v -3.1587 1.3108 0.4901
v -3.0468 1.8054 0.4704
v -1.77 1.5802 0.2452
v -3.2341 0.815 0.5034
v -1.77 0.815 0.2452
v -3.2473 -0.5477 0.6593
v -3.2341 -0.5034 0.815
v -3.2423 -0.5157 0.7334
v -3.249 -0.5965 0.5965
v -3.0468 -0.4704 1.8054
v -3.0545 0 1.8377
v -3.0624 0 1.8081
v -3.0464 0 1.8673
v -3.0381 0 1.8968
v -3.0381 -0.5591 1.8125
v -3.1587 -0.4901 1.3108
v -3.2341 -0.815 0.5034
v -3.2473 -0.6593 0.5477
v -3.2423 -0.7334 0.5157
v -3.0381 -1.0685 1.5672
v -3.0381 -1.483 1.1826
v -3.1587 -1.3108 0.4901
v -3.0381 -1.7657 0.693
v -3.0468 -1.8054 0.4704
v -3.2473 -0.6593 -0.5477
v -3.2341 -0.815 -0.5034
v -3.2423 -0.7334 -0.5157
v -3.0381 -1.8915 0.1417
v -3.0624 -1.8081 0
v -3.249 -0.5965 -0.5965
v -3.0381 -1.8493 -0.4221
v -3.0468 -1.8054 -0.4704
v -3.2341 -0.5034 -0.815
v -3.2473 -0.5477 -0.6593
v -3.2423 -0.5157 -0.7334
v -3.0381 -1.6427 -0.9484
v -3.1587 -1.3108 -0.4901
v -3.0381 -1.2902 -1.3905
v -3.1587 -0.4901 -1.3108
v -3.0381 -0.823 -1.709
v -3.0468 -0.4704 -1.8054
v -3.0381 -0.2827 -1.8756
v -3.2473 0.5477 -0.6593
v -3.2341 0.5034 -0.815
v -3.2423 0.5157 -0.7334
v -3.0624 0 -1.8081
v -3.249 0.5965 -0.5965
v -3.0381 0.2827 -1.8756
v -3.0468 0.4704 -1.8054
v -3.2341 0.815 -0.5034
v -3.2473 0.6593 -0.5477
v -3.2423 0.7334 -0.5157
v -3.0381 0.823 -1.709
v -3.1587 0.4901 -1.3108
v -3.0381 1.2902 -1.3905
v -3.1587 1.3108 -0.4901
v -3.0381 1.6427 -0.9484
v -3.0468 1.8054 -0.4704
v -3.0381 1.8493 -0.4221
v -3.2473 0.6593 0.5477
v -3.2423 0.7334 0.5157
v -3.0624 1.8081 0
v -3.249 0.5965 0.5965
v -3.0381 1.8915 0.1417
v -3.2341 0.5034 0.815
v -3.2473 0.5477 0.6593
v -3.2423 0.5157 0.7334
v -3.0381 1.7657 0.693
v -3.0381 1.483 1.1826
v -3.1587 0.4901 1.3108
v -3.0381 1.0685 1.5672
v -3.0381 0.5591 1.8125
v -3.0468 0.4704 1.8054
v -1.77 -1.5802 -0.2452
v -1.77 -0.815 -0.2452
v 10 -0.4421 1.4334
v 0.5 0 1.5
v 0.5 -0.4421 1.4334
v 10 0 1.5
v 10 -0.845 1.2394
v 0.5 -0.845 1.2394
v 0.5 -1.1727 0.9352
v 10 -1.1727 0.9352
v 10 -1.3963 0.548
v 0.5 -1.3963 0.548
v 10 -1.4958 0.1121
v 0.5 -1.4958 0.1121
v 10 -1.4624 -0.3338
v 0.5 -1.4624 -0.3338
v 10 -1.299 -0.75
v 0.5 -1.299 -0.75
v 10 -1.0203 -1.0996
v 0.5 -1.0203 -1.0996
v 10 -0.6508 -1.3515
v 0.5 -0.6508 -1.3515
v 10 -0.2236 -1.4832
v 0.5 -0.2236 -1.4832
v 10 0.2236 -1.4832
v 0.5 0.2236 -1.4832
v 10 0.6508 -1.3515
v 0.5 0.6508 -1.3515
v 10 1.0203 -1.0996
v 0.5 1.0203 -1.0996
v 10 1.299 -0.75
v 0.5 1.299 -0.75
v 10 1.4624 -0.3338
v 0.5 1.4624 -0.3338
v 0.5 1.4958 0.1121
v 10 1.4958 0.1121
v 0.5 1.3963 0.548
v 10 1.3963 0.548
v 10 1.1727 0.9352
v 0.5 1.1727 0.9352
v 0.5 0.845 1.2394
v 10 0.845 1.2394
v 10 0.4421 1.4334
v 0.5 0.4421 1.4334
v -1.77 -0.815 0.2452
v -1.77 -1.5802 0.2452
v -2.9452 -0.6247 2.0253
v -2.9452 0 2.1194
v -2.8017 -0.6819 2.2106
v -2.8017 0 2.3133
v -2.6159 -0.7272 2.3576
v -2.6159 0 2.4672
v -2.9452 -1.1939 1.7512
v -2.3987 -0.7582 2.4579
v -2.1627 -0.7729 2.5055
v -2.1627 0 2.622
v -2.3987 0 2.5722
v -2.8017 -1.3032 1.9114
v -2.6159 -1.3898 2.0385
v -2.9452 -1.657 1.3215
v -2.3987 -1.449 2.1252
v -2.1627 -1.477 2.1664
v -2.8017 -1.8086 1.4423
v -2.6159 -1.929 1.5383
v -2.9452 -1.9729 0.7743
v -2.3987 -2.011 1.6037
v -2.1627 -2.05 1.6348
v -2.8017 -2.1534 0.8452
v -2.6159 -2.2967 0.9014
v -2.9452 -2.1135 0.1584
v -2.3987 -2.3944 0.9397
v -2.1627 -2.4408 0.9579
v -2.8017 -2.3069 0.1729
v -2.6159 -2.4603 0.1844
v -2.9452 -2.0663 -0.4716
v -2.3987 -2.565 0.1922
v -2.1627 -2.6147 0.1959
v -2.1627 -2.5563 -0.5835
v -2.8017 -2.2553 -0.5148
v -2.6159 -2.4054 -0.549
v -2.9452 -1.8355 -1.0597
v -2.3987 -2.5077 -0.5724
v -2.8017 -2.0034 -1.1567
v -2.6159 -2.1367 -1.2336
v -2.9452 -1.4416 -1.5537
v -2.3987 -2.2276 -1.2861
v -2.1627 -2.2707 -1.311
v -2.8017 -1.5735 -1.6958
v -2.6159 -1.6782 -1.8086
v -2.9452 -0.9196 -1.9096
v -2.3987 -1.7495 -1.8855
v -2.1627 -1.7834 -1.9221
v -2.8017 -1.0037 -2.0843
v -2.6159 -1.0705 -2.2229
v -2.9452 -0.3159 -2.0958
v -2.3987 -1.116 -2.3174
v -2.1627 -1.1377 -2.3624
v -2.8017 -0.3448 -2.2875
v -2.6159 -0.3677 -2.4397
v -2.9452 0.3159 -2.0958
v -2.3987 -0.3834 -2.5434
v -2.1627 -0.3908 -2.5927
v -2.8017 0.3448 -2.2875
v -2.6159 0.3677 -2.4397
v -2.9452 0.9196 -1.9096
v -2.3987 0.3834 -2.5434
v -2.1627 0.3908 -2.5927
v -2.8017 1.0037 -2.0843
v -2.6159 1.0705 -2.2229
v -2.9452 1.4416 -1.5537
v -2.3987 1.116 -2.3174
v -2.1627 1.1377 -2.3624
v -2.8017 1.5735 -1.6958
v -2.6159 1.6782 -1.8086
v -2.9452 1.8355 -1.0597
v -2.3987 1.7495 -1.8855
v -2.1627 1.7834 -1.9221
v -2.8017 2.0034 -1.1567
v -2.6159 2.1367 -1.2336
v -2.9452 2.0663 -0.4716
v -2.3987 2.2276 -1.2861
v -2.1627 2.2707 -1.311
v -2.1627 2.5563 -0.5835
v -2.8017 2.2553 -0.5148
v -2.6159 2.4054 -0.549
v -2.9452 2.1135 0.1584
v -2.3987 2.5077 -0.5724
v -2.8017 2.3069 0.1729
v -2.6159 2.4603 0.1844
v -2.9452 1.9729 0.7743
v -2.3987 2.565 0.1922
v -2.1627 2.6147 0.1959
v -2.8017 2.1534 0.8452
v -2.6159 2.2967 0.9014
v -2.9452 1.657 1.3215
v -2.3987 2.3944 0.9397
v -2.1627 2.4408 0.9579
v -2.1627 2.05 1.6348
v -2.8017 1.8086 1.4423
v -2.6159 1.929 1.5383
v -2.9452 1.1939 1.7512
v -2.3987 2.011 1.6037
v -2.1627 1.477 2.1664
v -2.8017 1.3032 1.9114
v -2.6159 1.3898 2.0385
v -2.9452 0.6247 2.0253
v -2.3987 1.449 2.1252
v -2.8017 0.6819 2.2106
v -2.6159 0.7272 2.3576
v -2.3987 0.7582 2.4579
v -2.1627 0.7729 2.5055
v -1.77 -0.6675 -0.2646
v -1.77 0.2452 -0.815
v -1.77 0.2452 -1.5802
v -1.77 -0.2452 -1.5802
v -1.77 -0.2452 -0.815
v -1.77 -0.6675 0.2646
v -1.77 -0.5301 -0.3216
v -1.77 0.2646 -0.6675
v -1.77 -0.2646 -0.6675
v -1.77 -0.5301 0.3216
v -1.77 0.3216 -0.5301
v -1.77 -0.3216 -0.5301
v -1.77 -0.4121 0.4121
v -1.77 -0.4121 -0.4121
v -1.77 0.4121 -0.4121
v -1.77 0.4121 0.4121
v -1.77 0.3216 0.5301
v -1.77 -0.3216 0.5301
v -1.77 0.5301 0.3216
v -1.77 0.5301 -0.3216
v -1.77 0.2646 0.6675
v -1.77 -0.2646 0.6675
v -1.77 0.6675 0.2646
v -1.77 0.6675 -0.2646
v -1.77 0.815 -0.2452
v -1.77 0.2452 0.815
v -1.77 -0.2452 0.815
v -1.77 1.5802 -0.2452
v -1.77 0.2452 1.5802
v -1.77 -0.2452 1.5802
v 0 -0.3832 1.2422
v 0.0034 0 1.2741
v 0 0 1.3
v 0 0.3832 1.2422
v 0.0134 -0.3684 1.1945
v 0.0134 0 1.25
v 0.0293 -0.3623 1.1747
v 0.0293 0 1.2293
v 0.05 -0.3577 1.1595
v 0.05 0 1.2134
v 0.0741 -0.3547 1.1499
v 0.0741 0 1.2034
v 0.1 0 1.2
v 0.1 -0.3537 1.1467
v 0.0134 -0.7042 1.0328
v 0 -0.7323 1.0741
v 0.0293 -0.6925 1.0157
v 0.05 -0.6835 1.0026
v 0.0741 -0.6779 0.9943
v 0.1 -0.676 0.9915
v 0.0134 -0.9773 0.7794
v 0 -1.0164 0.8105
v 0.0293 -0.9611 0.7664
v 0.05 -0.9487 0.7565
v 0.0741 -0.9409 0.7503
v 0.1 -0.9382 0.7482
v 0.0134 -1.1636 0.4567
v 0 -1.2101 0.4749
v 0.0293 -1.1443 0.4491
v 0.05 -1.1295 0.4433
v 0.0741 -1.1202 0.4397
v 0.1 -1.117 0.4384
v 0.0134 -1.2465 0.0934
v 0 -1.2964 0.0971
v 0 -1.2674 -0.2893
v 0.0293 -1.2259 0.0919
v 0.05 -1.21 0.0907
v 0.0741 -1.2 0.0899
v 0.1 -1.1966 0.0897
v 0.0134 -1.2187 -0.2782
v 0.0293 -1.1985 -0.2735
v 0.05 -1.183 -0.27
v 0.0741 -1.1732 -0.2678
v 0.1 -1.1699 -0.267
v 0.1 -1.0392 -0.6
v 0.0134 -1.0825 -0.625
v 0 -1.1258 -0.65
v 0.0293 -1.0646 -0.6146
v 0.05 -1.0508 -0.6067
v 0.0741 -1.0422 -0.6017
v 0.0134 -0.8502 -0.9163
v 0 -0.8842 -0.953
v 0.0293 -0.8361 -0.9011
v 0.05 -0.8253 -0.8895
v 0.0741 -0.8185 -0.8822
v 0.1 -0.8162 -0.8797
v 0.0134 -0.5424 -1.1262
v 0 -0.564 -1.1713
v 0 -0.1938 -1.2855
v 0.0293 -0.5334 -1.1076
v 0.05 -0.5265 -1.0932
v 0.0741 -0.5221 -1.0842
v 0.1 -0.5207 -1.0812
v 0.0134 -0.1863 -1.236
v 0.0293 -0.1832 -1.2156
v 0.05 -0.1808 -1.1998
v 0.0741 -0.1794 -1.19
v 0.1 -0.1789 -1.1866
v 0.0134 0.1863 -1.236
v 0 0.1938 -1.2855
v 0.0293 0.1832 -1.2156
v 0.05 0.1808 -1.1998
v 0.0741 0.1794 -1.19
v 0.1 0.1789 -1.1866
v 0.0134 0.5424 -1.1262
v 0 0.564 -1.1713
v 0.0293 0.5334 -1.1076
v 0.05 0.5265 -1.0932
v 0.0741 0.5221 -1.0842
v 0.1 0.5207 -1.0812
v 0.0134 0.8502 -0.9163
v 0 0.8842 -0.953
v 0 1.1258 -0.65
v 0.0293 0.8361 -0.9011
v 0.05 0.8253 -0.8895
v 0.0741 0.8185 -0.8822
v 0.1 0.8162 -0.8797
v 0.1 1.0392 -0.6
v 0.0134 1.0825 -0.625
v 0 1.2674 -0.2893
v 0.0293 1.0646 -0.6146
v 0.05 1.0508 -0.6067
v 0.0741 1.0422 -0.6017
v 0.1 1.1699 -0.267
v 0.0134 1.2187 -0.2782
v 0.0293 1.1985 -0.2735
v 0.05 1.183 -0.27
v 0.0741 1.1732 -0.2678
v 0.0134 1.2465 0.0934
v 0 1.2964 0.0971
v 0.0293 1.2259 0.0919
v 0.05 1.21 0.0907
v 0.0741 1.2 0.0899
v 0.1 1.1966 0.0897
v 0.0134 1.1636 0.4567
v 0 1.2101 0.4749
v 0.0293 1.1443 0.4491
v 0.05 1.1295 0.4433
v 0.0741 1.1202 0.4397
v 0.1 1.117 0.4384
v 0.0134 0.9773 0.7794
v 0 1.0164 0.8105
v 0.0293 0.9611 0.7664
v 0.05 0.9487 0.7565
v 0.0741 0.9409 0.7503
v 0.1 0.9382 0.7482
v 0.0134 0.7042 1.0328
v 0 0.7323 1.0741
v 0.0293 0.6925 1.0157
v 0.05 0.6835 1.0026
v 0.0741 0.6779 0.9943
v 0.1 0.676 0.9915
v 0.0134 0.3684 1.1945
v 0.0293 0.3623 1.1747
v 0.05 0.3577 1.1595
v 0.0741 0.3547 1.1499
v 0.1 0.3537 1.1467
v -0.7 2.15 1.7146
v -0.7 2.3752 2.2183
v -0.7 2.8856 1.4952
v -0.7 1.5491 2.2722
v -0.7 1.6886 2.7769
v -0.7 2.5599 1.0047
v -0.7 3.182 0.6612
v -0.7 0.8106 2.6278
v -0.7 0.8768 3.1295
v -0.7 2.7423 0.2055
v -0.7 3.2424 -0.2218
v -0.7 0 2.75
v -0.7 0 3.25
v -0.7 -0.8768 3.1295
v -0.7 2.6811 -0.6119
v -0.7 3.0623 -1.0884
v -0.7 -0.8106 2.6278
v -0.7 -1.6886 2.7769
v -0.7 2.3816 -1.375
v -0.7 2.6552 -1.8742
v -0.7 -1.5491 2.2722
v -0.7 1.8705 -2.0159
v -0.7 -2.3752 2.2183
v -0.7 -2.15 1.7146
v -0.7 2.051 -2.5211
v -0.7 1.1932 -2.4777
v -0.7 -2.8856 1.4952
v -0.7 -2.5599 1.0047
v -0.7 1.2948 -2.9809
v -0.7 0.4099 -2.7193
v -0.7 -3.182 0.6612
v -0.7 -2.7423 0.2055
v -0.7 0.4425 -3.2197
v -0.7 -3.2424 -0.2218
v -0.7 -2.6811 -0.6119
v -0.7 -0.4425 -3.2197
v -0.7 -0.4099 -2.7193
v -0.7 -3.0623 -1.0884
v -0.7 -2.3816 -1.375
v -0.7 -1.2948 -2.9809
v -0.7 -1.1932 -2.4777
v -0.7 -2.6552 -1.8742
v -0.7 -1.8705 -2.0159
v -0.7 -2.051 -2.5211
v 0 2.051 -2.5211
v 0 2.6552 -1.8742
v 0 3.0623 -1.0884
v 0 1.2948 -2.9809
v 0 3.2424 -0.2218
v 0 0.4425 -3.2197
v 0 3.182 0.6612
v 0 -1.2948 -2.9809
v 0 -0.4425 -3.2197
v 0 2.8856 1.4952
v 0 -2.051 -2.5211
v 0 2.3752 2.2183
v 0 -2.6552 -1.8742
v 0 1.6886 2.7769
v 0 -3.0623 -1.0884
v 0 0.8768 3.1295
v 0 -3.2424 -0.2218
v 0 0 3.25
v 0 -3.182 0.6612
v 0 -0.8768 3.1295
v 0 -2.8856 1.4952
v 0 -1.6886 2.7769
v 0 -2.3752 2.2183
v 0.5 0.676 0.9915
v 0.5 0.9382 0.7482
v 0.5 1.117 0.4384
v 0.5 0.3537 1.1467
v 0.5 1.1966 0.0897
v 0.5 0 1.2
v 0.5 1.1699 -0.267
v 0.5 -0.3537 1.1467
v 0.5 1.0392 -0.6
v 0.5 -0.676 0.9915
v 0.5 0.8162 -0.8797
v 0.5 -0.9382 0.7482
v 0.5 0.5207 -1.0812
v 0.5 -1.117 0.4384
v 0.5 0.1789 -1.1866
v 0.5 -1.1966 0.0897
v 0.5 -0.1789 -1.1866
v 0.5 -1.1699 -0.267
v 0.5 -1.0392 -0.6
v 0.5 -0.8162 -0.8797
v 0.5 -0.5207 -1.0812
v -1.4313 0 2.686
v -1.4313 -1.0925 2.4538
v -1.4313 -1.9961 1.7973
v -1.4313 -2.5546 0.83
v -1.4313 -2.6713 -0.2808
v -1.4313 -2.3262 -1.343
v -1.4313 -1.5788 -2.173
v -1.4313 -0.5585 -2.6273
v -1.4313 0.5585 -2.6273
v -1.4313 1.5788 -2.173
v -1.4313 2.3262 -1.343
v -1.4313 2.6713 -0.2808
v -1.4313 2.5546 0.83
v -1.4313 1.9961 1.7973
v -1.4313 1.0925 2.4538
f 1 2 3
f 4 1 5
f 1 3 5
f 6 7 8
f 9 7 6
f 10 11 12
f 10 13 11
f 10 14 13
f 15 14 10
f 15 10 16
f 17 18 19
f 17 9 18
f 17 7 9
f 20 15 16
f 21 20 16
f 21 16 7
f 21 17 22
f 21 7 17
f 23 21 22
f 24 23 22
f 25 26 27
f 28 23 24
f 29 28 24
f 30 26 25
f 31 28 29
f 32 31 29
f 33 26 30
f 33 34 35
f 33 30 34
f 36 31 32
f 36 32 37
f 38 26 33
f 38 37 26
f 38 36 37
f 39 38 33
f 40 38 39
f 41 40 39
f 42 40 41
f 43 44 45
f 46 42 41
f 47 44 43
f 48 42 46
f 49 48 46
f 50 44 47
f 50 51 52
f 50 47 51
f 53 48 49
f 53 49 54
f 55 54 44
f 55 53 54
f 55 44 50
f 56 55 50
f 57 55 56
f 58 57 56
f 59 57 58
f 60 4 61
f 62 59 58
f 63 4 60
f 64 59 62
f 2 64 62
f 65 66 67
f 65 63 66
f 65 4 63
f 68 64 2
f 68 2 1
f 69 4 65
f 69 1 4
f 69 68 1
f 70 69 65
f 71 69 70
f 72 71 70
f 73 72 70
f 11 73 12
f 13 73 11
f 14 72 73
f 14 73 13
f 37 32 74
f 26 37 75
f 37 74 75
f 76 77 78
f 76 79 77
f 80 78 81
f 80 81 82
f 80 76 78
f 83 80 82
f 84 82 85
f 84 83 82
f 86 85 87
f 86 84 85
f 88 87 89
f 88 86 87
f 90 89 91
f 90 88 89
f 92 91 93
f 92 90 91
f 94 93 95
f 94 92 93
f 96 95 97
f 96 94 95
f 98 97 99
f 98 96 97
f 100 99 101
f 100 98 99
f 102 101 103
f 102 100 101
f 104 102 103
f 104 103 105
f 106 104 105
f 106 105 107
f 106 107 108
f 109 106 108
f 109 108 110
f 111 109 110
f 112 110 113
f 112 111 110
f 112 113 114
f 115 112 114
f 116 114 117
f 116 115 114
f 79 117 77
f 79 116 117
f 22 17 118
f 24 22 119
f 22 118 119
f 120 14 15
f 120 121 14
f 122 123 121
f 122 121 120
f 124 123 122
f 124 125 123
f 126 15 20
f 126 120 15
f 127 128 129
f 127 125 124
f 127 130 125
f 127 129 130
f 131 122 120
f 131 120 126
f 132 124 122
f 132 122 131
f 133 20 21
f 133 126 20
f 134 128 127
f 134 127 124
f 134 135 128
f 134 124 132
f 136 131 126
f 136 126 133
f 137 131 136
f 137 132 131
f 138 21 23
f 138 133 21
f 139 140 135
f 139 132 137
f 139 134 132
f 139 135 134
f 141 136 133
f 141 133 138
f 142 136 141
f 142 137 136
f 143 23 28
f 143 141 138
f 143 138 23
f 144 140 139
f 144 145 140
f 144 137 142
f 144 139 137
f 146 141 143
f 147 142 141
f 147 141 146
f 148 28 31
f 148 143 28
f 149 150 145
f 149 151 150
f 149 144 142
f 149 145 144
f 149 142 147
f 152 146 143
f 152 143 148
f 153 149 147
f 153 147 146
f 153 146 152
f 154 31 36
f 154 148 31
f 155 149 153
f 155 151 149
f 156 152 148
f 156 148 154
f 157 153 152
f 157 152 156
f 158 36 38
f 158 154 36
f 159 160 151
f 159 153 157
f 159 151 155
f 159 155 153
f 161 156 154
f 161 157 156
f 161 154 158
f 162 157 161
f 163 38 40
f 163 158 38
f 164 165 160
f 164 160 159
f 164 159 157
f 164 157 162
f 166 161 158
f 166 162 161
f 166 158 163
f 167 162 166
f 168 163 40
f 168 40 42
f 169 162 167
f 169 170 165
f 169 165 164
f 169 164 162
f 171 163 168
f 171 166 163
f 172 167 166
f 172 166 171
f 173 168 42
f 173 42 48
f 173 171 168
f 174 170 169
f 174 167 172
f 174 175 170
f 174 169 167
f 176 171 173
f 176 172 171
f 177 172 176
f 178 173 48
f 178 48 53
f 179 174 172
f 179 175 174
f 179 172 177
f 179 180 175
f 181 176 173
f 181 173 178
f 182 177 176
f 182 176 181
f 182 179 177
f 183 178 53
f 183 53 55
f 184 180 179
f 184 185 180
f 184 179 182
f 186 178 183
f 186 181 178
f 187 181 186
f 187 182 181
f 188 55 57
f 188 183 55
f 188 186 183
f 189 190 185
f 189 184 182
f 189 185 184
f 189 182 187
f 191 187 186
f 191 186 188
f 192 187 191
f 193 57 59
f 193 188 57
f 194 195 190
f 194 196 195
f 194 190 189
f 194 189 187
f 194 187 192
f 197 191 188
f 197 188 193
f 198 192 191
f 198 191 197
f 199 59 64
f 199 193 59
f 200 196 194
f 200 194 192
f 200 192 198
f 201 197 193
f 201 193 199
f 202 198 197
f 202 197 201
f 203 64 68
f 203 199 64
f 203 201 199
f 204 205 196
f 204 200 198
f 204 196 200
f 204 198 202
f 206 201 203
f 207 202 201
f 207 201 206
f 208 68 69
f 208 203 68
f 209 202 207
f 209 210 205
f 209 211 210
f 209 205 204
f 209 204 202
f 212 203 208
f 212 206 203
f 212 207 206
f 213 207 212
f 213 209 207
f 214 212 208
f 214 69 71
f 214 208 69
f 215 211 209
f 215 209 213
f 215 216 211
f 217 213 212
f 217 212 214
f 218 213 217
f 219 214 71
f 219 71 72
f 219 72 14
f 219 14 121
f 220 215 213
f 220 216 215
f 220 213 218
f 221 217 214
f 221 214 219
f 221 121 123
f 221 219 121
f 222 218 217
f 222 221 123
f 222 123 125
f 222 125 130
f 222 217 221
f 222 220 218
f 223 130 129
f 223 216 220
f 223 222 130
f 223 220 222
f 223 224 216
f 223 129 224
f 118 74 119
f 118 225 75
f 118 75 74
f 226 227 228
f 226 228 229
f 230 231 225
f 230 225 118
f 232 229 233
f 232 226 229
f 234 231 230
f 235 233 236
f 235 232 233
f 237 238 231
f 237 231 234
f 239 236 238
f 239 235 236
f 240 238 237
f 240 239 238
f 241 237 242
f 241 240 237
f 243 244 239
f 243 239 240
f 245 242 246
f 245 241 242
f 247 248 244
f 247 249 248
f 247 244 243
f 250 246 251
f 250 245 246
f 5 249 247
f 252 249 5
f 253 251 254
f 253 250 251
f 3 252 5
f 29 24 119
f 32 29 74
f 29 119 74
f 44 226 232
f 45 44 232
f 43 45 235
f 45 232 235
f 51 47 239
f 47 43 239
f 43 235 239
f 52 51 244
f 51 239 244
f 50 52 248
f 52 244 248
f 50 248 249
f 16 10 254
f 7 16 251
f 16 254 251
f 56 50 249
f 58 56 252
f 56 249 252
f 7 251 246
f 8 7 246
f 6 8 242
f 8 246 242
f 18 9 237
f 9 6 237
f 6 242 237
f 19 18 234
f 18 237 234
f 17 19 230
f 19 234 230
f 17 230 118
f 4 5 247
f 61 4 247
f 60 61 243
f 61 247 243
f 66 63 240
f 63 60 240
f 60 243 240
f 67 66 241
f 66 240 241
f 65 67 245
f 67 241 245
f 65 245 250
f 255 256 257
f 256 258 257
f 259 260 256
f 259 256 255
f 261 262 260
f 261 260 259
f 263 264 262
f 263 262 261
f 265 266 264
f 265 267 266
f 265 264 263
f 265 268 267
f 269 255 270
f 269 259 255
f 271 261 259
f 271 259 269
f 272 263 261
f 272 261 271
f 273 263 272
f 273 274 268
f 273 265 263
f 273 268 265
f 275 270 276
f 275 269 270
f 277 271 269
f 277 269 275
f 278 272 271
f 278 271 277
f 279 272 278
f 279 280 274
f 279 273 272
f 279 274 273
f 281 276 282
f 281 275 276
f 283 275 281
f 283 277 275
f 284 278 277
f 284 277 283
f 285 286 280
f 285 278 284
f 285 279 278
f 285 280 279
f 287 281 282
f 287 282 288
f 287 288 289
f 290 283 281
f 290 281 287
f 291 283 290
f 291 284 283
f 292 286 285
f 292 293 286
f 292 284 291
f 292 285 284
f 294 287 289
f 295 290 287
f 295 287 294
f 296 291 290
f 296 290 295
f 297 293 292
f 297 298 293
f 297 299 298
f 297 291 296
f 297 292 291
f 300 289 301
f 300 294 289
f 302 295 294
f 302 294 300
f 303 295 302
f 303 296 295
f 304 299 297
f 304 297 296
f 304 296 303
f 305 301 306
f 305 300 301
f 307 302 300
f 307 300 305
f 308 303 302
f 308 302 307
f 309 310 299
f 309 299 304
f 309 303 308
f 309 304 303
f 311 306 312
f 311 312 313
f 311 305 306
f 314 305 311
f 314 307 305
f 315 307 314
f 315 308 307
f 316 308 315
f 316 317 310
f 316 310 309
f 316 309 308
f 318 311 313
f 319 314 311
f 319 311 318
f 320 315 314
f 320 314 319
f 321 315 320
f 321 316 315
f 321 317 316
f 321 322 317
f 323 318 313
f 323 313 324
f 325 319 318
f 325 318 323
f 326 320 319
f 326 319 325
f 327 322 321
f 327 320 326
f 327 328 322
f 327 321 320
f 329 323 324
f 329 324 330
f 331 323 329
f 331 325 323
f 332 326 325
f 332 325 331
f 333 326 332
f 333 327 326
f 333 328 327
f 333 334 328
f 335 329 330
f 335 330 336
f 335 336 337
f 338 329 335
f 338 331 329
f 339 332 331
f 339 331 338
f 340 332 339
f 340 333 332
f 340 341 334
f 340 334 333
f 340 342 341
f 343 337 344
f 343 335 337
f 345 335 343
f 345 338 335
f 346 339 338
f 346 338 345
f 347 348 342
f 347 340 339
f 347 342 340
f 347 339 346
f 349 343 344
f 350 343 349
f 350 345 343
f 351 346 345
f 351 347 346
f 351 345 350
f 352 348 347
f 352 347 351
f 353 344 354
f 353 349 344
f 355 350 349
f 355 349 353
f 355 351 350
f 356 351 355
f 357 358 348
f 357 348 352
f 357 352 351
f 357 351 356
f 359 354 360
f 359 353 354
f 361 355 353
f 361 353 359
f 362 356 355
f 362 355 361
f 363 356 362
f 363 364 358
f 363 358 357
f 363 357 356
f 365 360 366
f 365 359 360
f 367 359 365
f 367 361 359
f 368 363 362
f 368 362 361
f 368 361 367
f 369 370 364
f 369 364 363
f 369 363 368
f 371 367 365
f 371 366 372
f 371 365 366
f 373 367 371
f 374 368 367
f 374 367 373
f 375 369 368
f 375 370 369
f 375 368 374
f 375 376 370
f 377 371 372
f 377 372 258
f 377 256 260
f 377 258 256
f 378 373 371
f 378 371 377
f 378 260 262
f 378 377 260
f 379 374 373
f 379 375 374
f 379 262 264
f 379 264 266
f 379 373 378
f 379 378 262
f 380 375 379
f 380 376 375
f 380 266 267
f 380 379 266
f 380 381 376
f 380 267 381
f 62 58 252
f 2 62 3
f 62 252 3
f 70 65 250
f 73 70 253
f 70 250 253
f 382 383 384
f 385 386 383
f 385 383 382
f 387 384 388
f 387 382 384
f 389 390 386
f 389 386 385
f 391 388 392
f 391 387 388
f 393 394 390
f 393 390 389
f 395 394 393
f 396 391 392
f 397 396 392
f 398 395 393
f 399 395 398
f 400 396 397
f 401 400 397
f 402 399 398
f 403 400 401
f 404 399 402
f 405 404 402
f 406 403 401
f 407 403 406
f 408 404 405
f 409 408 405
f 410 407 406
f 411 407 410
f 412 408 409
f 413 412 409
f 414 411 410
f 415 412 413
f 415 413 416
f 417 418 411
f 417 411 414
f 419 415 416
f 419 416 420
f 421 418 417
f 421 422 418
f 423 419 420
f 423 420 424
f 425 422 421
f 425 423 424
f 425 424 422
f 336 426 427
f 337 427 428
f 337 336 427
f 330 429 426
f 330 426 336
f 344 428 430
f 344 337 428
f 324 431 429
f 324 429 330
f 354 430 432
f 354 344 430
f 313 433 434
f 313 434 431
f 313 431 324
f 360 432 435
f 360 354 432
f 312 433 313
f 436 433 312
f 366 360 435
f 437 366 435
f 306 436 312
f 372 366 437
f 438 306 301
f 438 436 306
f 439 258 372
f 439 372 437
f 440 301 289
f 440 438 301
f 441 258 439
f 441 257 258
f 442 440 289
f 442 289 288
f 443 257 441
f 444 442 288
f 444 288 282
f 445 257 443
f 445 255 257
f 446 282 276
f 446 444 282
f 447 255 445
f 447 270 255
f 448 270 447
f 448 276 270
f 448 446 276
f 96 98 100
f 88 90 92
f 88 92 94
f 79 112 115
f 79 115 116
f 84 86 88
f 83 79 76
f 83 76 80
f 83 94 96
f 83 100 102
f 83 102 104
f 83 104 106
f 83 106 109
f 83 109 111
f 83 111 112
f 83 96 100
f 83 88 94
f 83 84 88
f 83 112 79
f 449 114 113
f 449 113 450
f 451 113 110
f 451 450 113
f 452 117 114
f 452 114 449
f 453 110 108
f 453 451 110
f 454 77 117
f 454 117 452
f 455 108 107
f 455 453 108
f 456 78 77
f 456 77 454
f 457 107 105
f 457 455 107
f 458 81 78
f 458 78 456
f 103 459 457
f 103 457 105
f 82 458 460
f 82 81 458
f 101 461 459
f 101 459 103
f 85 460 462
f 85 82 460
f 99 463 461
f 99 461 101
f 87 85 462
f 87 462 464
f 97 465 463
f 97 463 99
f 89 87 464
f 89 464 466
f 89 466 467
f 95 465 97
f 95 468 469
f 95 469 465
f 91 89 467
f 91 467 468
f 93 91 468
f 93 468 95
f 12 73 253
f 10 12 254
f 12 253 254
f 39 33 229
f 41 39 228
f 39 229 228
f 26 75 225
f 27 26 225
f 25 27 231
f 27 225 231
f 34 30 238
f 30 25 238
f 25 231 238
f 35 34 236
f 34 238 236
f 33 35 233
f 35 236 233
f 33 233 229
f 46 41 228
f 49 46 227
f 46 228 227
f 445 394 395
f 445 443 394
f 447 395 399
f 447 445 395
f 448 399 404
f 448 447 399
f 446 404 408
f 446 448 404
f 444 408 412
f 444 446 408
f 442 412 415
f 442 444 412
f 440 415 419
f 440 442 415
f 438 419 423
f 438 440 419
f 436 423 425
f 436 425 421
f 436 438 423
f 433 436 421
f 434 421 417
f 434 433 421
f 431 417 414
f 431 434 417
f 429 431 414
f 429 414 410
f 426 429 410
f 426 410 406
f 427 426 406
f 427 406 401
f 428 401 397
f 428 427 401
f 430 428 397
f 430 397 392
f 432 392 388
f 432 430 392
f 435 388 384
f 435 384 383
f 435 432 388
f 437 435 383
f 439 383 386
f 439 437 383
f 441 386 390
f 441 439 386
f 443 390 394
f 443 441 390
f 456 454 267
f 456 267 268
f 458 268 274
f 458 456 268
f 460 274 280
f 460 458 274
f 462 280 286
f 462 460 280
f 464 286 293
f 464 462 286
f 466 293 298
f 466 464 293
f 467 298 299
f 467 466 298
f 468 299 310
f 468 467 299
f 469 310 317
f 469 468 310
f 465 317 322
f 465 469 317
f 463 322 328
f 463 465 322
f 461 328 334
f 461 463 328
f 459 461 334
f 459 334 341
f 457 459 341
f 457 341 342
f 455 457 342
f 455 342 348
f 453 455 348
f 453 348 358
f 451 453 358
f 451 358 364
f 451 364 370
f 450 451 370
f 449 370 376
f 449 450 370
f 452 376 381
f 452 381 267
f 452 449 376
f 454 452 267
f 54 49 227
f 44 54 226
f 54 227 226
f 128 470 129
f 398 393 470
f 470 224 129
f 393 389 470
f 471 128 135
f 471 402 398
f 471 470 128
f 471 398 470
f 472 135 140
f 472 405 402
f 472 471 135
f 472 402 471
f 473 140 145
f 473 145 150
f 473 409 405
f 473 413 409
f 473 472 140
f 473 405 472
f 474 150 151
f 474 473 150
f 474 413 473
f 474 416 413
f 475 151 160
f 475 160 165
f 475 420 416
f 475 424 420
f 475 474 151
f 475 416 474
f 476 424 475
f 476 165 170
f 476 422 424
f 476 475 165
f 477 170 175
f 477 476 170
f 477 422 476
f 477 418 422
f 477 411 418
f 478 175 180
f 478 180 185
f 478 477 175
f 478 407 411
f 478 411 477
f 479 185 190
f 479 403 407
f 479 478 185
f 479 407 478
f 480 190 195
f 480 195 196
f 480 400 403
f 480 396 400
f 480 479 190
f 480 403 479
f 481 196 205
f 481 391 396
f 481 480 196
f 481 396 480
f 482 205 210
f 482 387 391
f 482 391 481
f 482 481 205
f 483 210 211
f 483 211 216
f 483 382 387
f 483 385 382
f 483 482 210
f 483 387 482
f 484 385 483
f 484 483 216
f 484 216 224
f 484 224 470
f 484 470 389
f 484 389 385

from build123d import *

# Parameters (mm, degrees)
CUT_EXTRUDE_1_DEPTH = 1.53
CUT_EXTRUDE_1_TAPER = 10
FILLET_1_R          = 0.1


with BuildPart() as part:
    # ｽｹｯﾁ1 → Revolve 892 (revolve)
    with BuildSketch(Plane.XY):
        with BuildLine():
            Line((-2.162677546, 2.622032296), (-0.7, 2.75))
            Line((-0.7, 2.75), (-0.7, 3.25))
            Line((-0.7, 3.25), (0, 3.25))
            Line((0, 3.25), (0, 1.2))
            Line((0, 1.2), (0.5, 1.2))
            Line((0.5, 1.2), (0.5, 1.5))
            Line((0.5, 1.5), (10, 1.5))
            Line((10, 1.5), (10, 0))
            Line((10, 0), (-3.3, 0))
            ThreePointArc((-3.3, 0), (-3.234218103, 0.957402372), (-3.038108771, 1.896810531))
            ThreePointArc((-3.038108771, 1.896810531), (-2.713468973, 2.395917729), (-2.162677546, 2.622032296))
        make_face()
    revolve(axis=Axis((0, 0, 0), (1, 0, 0)))

    # ｽｹｯﾁ2 → ｶｯﾄ - 押し出し1 (cut)
    with BuildSketch(Plane(origin=(-3.3, 0, 0), x_dir=(0, 0, -1), z_dir=(1, 0, 0))):
        with BuildLine():
            Line((0.515, -1.85), (0.515, -0.815))
            ThreePointArc((0.515, -0.815), (0.602867966, -0.602867966), (0.815, -0.515))
            Line((0.815, -0.515), (1.85, -0.515))
            Line((1.85, -0.515), (1.85, 0.515))
            Line((1.85, 0.515), (0.815, 0.515))
            ThreePointArc((0.815, 0.515), (0.602867966, 0.602867966), (0.515, 0.815))
            Line((0.515, 0.815), (0.515, 1.85))
            Line((0.515, 1.85), (-0.515, 1.85))
            Line((-0.515, 1.85), (-0.515, 0.815))
            ThreePointArc((-0.515, 0.815), (-0.602867966, 0.602867966), (-0.815, 0.515))
            Line((-0.815, 0.515), (-1.85, 0.515))
            Line((-1.85, 0.515), (-1.85, -0.515))
            Line((-1.85, -0.515), (-0.815, -0.515))
            ThreePointArc((-0.815, -0.515), (-0.602867966, -0.602867966), (-0.515, -0.815))
            Line((-0.515, -0.815), (-0.515, -1.85))
            Line((-0.515, -1.85), (0.515, -1.85))
        make_face()
    extrude(amount=CUT_EXTRUDE_1_DEPTH, taper=CUT_EXTRUDE_1_TAPER, mode=Mode.SUBTRACT)

    # ﾌｨﾚｯﾄ1
    fillet_1_edges = [part.edges().sort_by_distance(p)[0] for p in [
        (0, -1.2, 0),
    ]]
    fillet(fillet_1_edges, radius=FILLET_1_R)


solid = part.part
